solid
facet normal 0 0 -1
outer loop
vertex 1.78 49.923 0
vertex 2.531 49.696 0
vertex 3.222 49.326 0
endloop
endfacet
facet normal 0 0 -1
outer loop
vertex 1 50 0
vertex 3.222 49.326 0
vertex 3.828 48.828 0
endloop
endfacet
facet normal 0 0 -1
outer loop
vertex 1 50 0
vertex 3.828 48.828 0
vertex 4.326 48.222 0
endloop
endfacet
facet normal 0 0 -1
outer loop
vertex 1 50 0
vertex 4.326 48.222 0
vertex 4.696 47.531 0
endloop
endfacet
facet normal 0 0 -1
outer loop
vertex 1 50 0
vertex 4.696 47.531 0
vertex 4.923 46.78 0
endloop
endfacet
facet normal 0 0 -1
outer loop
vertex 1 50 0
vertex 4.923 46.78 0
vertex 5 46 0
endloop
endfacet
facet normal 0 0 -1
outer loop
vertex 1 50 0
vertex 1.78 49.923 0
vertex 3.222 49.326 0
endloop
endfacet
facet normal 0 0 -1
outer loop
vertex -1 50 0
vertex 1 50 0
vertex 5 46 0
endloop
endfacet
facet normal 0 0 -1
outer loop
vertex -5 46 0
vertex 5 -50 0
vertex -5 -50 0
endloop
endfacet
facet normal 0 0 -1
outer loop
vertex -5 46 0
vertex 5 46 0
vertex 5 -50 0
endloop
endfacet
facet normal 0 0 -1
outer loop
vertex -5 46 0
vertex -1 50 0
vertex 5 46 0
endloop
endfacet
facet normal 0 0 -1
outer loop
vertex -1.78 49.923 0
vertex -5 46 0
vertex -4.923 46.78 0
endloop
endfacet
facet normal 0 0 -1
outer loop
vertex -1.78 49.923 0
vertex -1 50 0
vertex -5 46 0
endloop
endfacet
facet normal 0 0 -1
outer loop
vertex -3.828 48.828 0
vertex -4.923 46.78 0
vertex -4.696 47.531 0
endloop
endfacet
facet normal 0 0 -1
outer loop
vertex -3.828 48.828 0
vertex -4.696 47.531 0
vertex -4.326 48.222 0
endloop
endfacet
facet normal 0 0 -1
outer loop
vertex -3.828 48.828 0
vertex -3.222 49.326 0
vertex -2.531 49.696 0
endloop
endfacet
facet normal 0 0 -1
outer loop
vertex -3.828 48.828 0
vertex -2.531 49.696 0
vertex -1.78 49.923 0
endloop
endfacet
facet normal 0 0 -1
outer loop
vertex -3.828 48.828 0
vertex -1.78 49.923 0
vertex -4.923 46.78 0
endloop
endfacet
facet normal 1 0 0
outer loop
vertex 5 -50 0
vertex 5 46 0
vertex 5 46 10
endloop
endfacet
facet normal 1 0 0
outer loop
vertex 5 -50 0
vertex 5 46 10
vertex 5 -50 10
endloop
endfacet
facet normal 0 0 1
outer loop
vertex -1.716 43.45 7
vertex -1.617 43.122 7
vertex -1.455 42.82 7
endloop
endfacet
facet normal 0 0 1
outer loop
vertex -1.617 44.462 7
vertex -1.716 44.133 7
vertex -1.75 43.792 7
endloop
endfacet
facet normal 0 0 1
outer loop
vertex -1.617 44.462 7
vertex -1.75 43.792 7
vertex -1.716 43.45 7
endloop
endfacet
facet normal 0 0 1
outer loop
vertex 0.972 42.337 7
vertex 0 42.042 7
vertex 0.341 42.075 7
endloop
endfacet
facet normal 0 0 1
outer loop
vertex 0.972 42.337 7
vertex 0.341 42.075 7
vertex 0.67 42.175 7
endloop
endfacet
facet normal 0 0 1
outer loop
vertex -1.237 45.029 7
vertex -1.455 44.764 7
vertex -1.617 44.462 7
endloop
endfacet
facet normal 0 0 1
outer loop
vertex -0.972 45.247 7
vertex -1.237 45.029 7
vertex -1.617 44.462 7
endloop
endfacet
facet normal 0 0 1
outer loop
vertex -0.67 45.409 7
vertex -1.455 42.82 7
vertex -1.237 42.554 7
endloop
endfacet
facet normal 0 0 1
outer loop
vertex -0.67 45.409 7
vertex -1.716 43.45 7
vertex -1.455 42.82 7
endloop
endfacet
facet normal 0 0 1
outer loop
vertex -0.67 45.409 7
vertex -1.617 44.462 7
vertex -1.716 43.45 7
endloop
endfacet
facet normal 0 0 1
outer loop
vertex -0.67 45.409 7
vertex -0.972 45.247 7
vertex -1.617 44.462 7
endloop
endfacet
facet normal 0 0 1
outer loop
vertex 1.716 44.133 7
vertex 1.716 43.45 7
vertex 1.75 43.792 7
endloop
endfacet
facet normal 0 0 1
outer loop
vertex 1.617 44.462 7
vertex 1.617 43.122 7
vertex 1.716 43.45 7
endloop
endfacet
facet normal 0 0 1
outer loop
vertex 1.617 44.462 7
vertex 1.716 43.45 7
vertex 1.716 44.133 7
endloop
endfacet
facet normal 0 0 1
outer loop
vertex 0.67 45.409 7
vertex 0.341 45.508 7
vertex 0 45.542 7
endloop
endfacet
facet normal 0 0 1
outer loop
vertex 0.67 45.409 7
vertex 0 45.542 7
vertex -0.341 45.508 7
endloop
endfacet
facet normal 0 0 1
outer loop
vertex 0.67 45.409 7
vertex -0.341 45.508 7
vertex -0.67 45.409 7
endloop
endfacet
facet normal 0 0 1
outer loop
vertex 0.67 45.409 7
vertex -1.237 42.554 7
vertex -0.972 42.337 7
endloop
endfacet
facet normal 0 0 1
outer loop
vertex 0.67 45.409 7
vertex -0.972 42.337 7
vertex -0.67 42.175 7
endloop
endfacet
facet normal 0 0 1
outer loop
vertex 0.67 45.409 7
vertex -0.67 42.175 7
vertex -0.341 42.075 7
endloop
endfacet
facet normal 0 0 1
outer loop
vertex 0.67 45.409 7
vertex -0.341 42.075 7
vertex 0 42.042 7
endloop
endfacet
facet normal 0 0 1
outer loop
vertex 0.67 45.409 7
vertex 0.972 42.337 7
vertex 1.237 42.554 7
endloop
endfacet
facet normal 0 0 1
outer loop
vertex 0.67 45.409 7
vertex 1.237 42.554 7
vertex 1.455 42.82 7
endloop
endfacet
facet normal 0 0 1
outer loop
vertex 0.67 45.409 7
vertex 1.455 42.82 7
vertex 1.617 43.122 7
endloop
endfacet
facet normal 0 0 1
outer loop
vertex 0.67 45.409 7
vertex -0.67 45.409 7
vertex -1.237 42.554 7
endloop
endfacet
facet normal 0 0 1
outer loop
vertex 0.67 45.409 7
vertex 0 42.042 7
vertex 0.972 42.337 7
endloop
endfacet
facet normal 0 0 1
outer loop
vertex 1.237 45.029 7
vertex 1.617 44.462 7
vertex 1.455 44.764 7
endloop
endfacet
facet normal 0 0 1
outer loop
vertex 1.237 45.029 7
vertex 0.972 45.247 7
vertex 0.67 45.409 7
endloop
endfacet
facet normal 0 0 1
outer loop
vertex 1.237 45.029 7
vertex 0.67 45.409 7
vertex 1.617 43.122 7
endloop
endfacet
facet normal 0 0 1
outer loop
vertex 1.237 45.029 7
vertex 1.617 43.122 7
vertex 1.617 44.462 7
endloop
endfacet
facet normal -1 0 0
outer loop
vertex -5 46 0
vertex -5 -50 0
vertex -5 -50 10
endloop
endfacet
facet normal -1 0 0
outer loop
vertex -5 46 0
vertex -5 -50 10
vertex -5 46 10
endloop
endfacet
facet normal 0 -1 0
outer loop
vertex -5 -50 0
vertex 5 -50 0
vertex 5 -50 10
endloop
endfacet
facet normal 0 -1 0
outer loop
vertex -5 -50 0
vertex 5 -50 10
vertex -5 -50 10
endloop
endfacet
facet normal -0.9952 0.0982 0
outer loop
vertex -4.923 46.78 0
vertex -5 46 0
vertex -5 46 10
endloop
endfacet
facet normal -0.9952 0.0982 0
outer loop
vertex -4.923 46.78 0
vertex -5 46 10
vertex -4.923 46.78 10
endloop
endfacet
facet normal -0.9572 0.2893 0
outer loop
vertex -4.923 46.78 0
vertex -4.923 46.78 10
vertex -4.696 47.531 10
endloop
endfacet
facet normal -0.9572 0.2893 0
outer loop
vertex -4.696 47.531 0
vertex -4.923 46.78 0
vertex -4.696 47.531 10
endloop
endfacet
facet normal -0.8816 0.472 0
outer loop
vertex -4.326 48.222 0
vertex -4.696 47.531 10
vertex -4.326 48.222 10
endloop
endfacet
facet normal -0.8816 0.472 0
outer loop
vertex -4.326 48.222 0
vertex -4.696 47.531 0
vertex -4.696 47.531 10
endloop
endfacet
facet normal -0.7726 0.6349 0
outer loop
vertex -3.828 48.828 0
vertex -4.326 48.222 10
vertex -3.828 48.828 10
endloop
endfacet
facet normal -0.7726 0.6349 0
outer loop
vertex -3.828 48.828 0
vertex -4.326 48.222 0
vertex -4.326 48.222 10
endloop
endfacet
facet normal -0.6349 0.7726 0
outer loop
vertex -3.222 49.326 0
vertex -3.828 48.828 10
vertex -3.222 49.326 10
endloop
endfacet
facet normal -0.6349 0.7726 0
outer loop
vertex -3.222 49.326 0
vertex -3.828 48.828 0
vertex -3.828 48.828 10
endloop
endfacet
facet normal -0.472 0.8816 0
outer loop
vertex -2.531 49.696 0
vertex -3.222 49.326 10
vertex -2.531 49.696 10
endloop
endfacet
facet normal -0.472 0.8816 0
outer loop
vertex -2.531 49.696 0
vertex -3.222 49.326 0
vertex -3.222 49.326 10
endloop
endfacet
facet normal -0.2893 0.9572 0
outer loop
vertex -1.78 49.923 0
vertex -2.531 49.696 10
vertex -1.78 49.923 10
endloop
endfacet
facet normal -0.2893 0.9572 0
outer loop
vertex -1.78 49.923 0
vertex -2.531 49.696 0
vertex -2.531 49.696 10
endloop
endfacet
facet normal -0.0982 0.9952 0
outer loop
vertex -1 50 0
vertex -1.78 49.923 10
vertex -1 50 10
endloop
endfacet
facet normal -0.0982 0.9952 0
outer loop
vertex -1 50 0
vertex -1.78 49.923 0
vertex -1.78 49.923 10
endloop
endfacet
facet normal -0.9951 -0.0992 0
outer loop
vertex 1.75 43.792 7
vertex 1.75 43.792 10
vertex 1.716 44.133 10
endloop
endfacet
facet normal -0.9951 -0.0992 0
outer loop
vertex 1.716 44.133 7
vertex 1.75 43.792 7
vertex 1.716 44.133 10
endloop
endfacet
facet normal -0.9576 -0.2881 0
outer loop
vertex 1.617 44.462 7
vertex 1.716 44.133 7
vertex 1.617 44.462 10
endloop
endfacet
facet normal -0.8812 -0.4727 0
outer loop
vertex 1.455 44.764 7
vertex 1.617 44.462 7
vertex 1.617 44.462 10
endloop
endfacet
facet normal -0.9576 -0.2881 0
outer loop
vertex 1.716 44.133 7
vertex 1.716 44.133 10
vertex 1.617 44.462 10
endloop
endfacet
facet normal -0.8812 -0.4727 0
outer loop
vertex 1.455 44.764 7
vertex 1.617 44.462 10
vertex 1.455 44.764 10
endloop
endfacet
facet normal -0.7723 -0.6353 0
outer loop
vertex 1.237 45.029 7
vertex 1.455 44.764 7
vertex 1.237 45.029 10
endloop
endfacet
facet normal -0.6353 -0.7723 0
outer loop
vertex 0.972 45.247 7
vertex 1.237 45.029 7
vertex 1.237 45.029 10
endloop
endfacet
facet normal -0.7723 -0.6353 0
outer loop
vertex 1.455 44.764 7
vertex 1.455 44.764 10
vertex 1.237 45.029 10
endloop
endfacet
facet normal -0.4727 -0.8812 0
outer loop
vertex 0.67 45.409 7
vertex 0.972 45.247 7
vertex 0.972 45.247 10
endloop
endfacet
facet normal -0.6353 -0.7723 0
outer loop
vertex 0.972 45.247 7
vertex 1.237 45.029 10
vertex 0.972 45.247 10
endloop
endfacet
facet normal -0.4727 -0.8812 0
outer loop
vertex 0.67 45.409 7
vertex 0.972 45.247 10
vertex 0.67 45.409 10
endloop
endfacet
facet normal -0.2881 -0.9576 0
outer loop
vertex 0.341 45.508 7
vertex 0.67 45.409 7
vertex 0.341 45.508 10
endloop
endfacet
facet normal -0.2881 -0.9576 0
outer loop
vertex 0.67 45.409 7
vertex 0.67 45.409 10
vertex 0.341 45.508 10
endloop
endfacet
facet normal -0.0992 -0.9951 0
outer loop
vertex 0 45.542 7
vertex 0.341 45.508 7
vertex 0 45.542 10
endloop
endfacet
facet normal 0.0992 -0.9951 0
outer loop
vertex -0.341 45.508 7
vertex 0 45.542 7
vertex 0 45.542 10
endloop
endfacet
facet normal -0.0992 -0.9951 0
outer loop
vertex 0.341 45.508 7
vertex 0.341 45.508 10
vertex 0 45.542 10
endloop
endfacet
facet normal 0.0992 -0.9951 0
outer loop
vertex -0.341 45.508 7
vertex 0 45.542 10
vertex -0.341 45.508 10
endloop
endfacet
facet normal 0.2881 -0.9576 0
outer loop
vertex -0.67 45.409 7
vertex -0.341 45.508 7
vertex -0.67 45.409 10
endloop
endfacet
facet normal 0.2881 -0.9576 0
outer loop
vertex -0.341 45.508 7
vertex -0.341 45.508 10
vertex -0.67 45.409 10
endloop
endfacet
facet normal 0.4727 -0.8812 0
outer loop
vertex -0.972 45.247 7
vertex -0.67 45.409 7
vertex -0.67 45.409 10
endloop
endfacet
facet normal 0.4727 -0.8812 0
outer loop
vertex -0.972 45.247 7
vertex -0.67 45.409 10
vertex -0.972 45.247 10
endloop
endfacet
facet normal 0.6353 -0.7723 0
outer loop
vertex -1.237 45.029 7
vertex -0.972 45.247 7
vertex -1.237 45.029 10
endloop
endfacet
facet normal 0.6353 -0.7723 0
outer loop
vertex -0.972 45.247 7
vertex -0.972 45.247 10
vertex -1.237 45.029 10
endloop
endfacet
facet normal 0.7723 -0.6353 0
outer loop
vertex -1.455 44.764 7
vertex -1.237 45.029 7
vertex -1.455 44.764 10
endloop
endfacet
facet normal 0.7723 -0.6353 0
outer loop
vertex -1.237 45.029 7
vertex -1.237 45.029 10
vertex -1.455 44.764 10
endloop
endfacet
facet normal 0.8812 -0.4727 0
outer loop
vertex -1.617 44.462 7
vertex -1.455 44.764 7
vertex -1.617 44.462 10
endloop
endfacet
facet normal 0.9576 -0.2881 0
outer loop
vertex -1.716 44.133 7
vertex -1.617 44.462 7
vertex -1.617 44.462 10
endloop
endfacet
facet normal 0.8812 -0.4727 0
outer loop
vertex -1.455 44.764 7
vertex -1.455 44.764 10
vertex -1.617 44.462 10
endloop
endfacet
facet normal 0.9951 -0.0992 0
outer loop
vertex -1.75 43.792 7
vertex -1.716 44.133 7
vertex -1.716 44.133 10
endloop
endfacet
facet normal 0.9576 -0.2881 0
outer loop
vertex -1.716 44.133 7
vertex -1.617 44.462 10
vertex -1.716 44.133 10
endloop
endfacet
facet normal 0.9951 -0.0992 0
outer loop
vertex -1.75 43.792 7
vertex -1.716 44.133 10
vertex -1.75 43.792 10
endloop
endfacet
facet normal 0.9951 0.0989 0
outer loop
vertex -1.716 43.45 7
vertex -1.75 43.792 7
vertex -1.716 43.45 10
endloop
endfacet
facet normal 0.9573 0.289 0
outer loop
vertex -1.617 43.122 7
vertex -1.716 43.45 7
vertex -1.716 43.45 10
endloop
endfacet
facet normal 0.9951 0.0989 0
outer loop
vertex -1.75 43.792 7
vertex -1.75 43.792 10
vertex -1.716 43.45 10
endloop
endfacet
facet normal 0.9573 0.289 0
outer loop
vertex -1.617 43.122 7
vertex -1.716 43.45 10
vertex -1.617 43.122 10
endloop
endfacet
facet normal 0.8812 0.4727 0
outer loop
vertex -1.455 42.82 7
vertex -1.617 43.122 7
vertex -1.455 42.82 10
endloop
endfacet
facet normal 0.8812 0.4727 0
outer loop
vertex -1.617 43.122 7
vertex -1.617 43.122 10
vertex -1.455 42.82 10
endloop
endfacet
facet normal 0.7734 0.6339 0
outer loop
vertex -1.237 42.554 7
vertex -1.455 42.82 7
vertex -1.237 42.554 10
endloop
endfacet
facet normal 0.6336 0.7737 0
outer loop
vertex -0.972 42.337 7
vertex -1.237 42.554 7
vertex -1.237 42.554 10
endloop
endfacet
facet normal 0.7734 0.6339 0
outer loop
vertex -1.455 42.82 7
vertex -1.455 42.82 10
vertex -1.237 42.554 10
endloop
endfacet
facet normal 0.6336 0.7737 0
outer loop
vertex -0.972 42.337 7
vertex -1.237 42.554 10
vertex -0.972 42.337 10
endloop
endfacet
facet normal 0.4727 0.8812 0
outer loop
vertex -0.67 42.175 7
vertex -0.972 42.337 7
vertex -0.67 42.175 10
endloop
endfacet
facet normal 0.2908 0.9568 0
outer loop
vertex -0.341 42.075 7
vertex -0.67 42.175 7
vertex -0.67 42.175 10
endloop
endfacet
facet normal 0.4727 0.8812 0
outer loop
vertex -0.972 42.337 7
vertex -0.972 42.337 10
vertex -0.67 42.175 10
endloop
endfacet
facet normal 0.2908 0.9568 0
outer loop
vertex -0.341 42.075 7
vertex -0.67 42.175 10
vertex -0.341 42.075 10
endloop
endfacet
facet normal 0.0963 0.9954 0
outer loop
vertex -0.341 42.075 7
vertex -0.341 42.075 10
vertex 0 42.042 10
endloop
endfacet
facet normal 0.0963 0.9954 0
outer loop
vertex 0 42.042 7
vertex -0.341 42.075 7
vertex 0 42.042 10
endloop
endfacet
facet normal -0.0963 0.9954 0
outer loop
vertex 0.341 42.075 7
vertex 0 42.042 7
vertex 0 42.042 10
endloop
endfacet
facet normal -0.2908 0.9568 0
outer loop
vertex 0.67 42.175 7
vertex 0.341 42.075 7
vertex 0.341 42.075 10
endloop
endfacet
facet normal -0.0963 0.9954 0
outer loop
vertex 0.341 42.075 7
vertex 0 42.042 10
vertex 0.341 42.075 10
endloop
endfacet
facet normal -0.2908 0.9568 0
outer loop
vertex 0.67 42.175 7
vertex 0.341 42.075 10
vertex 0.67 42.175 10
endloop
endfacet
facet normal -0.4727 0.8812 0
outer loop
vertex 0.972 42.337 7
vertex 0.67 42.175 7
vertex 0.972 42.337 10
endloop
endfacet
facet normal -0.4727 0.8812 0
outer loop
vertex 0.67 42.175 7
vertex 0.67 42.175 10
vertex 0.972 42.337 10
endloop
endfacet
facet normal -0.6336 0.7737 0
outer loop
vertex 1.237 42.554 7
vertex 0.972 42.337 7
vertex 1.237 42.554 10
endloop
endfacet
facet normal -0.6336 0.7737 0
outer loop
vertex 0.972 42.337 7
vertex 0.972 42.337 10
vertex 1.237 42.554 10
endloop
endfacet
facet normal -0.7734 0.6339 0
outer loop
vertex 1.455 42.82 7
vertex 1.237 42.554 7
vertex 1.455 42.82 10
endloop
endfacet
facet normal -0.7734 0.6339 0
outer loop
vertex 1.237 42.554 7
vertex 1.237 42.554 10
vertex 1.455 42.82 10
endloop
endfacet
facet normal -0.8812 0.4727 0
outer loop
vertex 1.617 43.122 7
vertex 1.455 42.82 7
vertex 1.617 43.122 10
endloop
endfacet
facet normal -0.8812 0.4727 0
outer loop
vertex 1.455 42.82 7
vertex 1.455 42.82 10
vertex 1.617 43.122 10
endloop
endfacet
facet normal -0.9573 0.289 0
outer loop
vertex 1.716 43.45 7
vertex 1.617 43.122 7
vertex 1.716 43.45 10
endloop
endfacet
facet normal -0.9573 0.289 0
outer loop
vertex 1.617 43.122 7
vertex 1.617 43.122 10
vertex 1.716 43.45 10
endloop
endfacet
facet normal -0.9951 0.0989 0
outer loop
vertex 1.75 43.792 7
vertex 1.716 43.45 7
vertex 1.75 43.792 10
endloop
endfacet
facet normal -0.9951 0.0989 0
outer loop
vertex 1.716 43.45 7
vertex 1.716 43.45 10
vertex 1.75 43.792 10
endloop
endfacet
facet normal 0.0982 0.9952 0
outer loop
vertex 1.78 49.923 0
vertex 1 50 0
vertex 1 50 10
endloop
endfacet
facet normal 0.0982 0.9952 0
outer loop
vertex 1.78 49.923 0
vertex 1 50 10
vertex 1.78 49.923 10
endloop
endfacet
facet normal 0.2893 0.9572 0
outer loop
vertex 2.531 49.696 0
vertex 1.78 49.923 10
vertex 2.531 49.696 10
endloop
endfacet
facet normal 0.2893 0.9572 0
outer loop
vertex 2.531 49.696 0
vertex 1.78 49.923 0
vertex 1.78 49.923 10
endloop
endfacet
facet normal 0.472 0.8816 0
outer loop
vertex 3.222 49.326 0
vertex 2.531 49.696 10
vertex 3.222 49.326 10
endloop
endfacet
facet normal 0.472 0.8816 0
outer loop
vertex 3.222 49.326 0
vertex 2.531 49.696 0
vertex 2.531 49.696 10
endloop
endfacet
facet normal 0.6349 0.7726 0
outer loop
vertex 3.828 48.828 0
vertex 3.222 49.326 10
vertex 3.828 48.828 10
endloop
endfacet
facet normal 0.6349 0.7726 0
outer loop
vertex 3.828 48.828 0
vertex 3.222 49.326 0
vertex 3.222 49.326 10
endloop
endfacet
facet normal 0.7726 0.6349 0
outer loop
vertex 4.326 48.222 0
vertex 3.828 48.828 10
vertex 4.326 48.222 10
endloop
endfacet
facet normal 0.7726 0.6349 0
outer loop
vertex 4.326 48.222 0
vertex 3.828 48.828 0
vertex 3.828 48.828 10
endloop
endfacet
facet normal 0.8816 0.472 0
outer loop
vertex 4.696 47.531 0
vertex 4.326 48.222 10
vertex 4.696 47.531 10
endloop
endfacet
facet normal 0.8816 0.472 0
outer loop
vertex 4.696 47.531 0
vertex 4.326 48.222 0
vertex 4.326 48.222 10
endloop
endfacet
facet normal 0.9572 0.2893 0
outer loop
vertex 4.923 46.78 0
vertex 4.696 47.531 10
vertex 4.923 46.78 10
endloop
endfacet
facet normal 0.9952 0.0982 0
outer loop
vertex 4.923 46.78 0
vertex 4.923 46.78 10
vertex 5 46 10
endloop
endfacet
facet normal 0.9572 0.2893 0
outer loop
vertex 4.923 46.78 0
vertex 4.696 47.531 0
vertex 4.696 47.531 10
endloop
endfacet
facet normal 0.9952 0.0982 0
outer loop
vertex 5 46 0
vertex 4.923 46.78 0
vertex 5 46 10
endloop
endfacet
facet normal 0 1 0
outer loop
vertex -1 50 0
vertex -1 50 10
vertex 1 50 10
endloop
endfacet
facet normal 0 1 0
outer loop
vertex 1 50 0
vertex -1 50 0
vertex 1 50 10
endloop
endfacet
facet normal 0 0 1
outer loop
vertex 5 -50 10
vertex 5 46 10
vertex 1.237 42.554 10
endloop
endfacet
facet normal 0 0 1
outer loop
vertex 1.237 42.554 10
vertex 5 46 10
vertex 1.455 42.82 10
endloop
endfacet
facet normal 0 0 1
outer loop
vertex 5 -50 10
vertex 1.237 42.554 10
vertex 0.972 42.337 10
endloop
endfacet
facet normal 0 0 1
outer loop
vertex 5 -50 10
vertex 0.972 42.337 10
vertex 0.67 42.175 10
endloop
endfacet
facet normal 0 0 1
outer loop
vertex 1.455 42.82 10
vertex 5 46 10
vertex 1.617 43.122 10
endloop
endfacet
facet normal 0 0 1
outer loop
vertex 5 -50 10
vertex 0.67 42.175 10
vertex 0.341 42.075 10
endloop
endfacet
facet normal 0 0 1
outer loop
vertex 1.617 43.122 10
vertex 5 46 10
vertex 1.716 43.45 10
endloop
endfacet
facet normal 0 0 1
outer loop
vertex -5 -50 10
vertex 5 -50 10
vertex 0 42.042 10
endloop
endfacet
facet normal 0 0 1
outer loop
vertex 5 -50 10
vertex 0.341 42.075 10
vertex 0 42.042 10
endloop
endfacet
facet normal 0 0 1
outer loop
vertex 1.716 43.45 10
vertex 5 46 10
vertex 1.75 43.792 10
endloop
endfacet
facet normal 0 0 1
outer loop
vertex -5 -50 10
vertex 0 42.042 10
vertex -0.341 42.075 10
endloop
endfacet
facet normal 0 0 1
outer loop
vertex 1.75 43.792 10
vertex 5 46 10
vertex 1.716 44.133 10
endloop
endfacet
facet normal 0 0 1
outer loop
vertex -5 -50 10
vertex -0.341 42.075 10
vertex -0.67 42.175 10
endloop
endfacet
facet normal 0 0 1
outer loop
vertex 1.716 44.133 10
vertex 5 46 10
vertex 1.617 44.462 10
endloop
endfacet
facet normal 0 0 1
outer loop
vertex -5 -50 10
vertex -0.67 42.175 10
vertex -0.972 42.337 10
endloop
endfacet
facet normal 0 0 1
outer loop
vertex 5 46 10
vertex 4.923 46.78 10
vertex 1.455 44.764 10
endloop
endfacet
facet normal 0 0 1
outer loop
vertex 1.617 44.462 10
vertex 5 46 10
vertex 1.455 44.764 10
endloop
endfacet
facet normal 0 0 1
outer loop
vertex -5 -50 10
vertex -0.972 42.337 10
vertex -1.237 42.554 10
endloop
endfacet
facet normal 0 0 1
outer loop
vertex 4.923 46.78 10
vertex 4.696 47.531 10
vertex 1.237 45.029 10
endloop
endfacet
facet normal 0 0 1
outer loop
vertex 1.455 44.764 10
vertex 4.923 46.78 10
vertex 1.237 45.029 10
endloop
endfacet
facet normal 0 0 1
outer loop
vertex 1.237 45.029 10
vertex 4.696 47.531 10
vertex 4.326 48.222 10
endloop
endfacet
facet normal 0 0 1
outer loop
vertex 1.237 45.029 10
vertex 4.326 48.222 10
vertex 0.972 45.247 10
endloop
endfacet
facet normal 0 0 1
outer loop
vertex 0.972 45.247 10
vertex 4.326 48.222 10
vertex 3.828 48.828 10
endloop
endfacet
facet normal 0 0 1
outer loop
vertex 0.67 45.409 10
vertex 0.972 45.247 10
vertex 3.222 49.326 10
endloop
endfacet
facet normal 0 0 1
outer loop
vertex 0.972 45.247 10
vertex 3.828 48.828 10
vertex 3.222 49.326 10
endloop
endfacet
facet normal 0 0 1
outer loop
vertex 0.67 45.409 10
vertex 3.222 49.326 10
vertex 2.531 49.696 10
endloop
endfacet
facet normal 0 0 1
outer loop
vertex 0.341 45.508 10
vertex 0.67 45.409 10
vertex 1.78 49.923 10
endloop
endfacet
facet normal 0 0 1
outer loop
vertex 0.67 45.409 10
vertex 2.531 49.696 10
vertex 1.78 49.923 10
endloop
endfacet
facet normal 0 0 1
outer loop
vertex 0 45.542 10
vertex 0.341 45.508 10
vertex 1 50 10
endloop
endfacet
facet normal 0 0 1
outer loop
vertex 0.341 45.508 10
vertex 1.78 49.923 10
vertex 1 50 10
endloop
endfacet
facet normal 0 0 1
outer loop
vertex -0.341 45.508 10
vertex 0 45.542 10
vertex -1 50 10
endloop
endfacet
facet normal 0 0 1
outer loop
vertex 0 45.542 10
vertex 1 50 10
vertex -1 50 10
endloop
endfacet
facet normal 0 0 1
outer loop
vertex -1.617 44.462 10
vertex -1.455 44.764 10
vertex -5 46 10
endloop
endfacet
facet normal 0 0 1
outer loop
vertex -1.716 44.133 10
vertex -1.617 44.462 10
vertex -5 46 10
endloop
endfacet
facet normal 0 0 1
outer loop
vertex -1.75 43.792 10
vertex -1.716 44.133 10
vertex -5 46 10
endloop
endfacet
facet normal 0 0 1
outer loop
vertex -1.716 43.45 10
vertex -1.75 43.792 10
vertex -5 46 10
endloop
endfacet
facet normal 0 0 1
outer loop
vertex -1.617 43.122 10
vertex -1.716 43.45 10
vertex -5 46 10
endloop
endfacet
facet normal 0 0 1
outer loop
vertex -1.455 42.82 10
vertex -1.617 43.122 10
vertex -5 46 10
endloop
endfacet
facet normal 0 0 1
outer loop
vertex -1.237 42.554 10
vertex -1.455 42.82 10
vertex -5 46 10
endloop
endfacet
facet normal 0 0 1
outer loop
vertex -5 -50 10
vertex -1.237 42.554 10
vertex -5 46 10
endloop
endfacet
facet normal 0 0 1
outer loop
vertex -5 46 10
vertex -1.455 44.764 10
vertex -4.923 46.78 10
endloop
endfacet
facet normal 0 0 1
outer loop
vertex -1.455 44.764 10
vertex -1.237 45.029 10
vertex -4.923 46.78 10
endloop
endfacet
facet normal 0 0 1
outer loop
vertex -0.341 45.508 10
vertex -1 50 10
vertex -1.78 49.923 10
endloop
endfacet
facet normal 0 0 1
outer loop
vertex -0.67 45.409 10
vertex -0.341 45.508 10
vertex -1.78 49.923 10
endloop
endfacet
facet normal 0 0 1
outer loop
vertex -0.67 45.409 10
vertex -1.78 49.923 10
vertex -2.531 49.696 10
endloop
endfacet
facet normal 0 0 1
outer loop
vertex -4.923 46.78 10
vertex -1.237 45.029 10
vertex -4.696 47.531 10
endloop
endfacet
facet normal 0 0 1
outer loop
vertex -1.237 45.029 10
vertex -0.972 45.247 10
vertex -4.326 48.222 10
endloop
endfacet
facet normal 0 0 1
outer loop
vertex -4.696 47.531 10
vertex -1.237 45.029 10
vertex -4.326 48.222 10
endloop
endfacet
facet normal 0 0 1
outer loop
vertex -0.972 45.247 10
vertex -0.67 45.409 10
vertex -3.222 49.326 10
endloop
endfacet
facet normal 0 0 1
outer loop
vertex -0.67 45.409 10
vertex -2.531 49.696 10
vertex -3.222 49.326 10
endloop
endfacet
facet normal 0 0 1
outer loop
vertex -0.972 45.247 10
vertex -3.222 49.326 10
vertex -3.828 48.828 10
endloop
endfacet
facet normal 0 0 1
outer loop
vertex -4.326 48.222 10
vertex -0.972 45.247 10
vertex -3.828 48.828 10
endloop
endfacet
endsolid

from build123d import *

# Parameters (mm, degrees)
SALIENTE_EXTRUIR2_DEPTH = 10
CROQUIS2_R              = 1.75
CORTAR_EXTRUIR1_DEPTH   = 3


with BuildPart() as part:
    # Croquis1 → Saliente-Extruir2 (new body)
    with BuildSketch(Plane.XY):
        with BuildLine():
            Line((5, -50), (-5, -50))
            Line((-5, -50), (-5, 46))
            ThreePointArc((-5, 46), (-3.828427125, 48.828427125), (-1, 50))
            Line((-1, 50), (1, 50))
            ThreePointArc((1, 50), (3.828427125, 48.828427125), (5, 46))
            Line((5, 46), (5, -50))
        make_face()
    extrude(amount=SALIENTE_EXTRUIR2_DEPTH)

    # Croquis2 → Cortar-Extruir1 (cut)
    with BuildSketch(Plane.XY.offset(10)):
        with Locations((0, 43.791816943)):
            Circle(CROQUIS2_R)
    extrude(amount=-CORTAR_EXTRUIR1_DEPTH, mode=Mode.SUBTRACT)


solid = part.part
